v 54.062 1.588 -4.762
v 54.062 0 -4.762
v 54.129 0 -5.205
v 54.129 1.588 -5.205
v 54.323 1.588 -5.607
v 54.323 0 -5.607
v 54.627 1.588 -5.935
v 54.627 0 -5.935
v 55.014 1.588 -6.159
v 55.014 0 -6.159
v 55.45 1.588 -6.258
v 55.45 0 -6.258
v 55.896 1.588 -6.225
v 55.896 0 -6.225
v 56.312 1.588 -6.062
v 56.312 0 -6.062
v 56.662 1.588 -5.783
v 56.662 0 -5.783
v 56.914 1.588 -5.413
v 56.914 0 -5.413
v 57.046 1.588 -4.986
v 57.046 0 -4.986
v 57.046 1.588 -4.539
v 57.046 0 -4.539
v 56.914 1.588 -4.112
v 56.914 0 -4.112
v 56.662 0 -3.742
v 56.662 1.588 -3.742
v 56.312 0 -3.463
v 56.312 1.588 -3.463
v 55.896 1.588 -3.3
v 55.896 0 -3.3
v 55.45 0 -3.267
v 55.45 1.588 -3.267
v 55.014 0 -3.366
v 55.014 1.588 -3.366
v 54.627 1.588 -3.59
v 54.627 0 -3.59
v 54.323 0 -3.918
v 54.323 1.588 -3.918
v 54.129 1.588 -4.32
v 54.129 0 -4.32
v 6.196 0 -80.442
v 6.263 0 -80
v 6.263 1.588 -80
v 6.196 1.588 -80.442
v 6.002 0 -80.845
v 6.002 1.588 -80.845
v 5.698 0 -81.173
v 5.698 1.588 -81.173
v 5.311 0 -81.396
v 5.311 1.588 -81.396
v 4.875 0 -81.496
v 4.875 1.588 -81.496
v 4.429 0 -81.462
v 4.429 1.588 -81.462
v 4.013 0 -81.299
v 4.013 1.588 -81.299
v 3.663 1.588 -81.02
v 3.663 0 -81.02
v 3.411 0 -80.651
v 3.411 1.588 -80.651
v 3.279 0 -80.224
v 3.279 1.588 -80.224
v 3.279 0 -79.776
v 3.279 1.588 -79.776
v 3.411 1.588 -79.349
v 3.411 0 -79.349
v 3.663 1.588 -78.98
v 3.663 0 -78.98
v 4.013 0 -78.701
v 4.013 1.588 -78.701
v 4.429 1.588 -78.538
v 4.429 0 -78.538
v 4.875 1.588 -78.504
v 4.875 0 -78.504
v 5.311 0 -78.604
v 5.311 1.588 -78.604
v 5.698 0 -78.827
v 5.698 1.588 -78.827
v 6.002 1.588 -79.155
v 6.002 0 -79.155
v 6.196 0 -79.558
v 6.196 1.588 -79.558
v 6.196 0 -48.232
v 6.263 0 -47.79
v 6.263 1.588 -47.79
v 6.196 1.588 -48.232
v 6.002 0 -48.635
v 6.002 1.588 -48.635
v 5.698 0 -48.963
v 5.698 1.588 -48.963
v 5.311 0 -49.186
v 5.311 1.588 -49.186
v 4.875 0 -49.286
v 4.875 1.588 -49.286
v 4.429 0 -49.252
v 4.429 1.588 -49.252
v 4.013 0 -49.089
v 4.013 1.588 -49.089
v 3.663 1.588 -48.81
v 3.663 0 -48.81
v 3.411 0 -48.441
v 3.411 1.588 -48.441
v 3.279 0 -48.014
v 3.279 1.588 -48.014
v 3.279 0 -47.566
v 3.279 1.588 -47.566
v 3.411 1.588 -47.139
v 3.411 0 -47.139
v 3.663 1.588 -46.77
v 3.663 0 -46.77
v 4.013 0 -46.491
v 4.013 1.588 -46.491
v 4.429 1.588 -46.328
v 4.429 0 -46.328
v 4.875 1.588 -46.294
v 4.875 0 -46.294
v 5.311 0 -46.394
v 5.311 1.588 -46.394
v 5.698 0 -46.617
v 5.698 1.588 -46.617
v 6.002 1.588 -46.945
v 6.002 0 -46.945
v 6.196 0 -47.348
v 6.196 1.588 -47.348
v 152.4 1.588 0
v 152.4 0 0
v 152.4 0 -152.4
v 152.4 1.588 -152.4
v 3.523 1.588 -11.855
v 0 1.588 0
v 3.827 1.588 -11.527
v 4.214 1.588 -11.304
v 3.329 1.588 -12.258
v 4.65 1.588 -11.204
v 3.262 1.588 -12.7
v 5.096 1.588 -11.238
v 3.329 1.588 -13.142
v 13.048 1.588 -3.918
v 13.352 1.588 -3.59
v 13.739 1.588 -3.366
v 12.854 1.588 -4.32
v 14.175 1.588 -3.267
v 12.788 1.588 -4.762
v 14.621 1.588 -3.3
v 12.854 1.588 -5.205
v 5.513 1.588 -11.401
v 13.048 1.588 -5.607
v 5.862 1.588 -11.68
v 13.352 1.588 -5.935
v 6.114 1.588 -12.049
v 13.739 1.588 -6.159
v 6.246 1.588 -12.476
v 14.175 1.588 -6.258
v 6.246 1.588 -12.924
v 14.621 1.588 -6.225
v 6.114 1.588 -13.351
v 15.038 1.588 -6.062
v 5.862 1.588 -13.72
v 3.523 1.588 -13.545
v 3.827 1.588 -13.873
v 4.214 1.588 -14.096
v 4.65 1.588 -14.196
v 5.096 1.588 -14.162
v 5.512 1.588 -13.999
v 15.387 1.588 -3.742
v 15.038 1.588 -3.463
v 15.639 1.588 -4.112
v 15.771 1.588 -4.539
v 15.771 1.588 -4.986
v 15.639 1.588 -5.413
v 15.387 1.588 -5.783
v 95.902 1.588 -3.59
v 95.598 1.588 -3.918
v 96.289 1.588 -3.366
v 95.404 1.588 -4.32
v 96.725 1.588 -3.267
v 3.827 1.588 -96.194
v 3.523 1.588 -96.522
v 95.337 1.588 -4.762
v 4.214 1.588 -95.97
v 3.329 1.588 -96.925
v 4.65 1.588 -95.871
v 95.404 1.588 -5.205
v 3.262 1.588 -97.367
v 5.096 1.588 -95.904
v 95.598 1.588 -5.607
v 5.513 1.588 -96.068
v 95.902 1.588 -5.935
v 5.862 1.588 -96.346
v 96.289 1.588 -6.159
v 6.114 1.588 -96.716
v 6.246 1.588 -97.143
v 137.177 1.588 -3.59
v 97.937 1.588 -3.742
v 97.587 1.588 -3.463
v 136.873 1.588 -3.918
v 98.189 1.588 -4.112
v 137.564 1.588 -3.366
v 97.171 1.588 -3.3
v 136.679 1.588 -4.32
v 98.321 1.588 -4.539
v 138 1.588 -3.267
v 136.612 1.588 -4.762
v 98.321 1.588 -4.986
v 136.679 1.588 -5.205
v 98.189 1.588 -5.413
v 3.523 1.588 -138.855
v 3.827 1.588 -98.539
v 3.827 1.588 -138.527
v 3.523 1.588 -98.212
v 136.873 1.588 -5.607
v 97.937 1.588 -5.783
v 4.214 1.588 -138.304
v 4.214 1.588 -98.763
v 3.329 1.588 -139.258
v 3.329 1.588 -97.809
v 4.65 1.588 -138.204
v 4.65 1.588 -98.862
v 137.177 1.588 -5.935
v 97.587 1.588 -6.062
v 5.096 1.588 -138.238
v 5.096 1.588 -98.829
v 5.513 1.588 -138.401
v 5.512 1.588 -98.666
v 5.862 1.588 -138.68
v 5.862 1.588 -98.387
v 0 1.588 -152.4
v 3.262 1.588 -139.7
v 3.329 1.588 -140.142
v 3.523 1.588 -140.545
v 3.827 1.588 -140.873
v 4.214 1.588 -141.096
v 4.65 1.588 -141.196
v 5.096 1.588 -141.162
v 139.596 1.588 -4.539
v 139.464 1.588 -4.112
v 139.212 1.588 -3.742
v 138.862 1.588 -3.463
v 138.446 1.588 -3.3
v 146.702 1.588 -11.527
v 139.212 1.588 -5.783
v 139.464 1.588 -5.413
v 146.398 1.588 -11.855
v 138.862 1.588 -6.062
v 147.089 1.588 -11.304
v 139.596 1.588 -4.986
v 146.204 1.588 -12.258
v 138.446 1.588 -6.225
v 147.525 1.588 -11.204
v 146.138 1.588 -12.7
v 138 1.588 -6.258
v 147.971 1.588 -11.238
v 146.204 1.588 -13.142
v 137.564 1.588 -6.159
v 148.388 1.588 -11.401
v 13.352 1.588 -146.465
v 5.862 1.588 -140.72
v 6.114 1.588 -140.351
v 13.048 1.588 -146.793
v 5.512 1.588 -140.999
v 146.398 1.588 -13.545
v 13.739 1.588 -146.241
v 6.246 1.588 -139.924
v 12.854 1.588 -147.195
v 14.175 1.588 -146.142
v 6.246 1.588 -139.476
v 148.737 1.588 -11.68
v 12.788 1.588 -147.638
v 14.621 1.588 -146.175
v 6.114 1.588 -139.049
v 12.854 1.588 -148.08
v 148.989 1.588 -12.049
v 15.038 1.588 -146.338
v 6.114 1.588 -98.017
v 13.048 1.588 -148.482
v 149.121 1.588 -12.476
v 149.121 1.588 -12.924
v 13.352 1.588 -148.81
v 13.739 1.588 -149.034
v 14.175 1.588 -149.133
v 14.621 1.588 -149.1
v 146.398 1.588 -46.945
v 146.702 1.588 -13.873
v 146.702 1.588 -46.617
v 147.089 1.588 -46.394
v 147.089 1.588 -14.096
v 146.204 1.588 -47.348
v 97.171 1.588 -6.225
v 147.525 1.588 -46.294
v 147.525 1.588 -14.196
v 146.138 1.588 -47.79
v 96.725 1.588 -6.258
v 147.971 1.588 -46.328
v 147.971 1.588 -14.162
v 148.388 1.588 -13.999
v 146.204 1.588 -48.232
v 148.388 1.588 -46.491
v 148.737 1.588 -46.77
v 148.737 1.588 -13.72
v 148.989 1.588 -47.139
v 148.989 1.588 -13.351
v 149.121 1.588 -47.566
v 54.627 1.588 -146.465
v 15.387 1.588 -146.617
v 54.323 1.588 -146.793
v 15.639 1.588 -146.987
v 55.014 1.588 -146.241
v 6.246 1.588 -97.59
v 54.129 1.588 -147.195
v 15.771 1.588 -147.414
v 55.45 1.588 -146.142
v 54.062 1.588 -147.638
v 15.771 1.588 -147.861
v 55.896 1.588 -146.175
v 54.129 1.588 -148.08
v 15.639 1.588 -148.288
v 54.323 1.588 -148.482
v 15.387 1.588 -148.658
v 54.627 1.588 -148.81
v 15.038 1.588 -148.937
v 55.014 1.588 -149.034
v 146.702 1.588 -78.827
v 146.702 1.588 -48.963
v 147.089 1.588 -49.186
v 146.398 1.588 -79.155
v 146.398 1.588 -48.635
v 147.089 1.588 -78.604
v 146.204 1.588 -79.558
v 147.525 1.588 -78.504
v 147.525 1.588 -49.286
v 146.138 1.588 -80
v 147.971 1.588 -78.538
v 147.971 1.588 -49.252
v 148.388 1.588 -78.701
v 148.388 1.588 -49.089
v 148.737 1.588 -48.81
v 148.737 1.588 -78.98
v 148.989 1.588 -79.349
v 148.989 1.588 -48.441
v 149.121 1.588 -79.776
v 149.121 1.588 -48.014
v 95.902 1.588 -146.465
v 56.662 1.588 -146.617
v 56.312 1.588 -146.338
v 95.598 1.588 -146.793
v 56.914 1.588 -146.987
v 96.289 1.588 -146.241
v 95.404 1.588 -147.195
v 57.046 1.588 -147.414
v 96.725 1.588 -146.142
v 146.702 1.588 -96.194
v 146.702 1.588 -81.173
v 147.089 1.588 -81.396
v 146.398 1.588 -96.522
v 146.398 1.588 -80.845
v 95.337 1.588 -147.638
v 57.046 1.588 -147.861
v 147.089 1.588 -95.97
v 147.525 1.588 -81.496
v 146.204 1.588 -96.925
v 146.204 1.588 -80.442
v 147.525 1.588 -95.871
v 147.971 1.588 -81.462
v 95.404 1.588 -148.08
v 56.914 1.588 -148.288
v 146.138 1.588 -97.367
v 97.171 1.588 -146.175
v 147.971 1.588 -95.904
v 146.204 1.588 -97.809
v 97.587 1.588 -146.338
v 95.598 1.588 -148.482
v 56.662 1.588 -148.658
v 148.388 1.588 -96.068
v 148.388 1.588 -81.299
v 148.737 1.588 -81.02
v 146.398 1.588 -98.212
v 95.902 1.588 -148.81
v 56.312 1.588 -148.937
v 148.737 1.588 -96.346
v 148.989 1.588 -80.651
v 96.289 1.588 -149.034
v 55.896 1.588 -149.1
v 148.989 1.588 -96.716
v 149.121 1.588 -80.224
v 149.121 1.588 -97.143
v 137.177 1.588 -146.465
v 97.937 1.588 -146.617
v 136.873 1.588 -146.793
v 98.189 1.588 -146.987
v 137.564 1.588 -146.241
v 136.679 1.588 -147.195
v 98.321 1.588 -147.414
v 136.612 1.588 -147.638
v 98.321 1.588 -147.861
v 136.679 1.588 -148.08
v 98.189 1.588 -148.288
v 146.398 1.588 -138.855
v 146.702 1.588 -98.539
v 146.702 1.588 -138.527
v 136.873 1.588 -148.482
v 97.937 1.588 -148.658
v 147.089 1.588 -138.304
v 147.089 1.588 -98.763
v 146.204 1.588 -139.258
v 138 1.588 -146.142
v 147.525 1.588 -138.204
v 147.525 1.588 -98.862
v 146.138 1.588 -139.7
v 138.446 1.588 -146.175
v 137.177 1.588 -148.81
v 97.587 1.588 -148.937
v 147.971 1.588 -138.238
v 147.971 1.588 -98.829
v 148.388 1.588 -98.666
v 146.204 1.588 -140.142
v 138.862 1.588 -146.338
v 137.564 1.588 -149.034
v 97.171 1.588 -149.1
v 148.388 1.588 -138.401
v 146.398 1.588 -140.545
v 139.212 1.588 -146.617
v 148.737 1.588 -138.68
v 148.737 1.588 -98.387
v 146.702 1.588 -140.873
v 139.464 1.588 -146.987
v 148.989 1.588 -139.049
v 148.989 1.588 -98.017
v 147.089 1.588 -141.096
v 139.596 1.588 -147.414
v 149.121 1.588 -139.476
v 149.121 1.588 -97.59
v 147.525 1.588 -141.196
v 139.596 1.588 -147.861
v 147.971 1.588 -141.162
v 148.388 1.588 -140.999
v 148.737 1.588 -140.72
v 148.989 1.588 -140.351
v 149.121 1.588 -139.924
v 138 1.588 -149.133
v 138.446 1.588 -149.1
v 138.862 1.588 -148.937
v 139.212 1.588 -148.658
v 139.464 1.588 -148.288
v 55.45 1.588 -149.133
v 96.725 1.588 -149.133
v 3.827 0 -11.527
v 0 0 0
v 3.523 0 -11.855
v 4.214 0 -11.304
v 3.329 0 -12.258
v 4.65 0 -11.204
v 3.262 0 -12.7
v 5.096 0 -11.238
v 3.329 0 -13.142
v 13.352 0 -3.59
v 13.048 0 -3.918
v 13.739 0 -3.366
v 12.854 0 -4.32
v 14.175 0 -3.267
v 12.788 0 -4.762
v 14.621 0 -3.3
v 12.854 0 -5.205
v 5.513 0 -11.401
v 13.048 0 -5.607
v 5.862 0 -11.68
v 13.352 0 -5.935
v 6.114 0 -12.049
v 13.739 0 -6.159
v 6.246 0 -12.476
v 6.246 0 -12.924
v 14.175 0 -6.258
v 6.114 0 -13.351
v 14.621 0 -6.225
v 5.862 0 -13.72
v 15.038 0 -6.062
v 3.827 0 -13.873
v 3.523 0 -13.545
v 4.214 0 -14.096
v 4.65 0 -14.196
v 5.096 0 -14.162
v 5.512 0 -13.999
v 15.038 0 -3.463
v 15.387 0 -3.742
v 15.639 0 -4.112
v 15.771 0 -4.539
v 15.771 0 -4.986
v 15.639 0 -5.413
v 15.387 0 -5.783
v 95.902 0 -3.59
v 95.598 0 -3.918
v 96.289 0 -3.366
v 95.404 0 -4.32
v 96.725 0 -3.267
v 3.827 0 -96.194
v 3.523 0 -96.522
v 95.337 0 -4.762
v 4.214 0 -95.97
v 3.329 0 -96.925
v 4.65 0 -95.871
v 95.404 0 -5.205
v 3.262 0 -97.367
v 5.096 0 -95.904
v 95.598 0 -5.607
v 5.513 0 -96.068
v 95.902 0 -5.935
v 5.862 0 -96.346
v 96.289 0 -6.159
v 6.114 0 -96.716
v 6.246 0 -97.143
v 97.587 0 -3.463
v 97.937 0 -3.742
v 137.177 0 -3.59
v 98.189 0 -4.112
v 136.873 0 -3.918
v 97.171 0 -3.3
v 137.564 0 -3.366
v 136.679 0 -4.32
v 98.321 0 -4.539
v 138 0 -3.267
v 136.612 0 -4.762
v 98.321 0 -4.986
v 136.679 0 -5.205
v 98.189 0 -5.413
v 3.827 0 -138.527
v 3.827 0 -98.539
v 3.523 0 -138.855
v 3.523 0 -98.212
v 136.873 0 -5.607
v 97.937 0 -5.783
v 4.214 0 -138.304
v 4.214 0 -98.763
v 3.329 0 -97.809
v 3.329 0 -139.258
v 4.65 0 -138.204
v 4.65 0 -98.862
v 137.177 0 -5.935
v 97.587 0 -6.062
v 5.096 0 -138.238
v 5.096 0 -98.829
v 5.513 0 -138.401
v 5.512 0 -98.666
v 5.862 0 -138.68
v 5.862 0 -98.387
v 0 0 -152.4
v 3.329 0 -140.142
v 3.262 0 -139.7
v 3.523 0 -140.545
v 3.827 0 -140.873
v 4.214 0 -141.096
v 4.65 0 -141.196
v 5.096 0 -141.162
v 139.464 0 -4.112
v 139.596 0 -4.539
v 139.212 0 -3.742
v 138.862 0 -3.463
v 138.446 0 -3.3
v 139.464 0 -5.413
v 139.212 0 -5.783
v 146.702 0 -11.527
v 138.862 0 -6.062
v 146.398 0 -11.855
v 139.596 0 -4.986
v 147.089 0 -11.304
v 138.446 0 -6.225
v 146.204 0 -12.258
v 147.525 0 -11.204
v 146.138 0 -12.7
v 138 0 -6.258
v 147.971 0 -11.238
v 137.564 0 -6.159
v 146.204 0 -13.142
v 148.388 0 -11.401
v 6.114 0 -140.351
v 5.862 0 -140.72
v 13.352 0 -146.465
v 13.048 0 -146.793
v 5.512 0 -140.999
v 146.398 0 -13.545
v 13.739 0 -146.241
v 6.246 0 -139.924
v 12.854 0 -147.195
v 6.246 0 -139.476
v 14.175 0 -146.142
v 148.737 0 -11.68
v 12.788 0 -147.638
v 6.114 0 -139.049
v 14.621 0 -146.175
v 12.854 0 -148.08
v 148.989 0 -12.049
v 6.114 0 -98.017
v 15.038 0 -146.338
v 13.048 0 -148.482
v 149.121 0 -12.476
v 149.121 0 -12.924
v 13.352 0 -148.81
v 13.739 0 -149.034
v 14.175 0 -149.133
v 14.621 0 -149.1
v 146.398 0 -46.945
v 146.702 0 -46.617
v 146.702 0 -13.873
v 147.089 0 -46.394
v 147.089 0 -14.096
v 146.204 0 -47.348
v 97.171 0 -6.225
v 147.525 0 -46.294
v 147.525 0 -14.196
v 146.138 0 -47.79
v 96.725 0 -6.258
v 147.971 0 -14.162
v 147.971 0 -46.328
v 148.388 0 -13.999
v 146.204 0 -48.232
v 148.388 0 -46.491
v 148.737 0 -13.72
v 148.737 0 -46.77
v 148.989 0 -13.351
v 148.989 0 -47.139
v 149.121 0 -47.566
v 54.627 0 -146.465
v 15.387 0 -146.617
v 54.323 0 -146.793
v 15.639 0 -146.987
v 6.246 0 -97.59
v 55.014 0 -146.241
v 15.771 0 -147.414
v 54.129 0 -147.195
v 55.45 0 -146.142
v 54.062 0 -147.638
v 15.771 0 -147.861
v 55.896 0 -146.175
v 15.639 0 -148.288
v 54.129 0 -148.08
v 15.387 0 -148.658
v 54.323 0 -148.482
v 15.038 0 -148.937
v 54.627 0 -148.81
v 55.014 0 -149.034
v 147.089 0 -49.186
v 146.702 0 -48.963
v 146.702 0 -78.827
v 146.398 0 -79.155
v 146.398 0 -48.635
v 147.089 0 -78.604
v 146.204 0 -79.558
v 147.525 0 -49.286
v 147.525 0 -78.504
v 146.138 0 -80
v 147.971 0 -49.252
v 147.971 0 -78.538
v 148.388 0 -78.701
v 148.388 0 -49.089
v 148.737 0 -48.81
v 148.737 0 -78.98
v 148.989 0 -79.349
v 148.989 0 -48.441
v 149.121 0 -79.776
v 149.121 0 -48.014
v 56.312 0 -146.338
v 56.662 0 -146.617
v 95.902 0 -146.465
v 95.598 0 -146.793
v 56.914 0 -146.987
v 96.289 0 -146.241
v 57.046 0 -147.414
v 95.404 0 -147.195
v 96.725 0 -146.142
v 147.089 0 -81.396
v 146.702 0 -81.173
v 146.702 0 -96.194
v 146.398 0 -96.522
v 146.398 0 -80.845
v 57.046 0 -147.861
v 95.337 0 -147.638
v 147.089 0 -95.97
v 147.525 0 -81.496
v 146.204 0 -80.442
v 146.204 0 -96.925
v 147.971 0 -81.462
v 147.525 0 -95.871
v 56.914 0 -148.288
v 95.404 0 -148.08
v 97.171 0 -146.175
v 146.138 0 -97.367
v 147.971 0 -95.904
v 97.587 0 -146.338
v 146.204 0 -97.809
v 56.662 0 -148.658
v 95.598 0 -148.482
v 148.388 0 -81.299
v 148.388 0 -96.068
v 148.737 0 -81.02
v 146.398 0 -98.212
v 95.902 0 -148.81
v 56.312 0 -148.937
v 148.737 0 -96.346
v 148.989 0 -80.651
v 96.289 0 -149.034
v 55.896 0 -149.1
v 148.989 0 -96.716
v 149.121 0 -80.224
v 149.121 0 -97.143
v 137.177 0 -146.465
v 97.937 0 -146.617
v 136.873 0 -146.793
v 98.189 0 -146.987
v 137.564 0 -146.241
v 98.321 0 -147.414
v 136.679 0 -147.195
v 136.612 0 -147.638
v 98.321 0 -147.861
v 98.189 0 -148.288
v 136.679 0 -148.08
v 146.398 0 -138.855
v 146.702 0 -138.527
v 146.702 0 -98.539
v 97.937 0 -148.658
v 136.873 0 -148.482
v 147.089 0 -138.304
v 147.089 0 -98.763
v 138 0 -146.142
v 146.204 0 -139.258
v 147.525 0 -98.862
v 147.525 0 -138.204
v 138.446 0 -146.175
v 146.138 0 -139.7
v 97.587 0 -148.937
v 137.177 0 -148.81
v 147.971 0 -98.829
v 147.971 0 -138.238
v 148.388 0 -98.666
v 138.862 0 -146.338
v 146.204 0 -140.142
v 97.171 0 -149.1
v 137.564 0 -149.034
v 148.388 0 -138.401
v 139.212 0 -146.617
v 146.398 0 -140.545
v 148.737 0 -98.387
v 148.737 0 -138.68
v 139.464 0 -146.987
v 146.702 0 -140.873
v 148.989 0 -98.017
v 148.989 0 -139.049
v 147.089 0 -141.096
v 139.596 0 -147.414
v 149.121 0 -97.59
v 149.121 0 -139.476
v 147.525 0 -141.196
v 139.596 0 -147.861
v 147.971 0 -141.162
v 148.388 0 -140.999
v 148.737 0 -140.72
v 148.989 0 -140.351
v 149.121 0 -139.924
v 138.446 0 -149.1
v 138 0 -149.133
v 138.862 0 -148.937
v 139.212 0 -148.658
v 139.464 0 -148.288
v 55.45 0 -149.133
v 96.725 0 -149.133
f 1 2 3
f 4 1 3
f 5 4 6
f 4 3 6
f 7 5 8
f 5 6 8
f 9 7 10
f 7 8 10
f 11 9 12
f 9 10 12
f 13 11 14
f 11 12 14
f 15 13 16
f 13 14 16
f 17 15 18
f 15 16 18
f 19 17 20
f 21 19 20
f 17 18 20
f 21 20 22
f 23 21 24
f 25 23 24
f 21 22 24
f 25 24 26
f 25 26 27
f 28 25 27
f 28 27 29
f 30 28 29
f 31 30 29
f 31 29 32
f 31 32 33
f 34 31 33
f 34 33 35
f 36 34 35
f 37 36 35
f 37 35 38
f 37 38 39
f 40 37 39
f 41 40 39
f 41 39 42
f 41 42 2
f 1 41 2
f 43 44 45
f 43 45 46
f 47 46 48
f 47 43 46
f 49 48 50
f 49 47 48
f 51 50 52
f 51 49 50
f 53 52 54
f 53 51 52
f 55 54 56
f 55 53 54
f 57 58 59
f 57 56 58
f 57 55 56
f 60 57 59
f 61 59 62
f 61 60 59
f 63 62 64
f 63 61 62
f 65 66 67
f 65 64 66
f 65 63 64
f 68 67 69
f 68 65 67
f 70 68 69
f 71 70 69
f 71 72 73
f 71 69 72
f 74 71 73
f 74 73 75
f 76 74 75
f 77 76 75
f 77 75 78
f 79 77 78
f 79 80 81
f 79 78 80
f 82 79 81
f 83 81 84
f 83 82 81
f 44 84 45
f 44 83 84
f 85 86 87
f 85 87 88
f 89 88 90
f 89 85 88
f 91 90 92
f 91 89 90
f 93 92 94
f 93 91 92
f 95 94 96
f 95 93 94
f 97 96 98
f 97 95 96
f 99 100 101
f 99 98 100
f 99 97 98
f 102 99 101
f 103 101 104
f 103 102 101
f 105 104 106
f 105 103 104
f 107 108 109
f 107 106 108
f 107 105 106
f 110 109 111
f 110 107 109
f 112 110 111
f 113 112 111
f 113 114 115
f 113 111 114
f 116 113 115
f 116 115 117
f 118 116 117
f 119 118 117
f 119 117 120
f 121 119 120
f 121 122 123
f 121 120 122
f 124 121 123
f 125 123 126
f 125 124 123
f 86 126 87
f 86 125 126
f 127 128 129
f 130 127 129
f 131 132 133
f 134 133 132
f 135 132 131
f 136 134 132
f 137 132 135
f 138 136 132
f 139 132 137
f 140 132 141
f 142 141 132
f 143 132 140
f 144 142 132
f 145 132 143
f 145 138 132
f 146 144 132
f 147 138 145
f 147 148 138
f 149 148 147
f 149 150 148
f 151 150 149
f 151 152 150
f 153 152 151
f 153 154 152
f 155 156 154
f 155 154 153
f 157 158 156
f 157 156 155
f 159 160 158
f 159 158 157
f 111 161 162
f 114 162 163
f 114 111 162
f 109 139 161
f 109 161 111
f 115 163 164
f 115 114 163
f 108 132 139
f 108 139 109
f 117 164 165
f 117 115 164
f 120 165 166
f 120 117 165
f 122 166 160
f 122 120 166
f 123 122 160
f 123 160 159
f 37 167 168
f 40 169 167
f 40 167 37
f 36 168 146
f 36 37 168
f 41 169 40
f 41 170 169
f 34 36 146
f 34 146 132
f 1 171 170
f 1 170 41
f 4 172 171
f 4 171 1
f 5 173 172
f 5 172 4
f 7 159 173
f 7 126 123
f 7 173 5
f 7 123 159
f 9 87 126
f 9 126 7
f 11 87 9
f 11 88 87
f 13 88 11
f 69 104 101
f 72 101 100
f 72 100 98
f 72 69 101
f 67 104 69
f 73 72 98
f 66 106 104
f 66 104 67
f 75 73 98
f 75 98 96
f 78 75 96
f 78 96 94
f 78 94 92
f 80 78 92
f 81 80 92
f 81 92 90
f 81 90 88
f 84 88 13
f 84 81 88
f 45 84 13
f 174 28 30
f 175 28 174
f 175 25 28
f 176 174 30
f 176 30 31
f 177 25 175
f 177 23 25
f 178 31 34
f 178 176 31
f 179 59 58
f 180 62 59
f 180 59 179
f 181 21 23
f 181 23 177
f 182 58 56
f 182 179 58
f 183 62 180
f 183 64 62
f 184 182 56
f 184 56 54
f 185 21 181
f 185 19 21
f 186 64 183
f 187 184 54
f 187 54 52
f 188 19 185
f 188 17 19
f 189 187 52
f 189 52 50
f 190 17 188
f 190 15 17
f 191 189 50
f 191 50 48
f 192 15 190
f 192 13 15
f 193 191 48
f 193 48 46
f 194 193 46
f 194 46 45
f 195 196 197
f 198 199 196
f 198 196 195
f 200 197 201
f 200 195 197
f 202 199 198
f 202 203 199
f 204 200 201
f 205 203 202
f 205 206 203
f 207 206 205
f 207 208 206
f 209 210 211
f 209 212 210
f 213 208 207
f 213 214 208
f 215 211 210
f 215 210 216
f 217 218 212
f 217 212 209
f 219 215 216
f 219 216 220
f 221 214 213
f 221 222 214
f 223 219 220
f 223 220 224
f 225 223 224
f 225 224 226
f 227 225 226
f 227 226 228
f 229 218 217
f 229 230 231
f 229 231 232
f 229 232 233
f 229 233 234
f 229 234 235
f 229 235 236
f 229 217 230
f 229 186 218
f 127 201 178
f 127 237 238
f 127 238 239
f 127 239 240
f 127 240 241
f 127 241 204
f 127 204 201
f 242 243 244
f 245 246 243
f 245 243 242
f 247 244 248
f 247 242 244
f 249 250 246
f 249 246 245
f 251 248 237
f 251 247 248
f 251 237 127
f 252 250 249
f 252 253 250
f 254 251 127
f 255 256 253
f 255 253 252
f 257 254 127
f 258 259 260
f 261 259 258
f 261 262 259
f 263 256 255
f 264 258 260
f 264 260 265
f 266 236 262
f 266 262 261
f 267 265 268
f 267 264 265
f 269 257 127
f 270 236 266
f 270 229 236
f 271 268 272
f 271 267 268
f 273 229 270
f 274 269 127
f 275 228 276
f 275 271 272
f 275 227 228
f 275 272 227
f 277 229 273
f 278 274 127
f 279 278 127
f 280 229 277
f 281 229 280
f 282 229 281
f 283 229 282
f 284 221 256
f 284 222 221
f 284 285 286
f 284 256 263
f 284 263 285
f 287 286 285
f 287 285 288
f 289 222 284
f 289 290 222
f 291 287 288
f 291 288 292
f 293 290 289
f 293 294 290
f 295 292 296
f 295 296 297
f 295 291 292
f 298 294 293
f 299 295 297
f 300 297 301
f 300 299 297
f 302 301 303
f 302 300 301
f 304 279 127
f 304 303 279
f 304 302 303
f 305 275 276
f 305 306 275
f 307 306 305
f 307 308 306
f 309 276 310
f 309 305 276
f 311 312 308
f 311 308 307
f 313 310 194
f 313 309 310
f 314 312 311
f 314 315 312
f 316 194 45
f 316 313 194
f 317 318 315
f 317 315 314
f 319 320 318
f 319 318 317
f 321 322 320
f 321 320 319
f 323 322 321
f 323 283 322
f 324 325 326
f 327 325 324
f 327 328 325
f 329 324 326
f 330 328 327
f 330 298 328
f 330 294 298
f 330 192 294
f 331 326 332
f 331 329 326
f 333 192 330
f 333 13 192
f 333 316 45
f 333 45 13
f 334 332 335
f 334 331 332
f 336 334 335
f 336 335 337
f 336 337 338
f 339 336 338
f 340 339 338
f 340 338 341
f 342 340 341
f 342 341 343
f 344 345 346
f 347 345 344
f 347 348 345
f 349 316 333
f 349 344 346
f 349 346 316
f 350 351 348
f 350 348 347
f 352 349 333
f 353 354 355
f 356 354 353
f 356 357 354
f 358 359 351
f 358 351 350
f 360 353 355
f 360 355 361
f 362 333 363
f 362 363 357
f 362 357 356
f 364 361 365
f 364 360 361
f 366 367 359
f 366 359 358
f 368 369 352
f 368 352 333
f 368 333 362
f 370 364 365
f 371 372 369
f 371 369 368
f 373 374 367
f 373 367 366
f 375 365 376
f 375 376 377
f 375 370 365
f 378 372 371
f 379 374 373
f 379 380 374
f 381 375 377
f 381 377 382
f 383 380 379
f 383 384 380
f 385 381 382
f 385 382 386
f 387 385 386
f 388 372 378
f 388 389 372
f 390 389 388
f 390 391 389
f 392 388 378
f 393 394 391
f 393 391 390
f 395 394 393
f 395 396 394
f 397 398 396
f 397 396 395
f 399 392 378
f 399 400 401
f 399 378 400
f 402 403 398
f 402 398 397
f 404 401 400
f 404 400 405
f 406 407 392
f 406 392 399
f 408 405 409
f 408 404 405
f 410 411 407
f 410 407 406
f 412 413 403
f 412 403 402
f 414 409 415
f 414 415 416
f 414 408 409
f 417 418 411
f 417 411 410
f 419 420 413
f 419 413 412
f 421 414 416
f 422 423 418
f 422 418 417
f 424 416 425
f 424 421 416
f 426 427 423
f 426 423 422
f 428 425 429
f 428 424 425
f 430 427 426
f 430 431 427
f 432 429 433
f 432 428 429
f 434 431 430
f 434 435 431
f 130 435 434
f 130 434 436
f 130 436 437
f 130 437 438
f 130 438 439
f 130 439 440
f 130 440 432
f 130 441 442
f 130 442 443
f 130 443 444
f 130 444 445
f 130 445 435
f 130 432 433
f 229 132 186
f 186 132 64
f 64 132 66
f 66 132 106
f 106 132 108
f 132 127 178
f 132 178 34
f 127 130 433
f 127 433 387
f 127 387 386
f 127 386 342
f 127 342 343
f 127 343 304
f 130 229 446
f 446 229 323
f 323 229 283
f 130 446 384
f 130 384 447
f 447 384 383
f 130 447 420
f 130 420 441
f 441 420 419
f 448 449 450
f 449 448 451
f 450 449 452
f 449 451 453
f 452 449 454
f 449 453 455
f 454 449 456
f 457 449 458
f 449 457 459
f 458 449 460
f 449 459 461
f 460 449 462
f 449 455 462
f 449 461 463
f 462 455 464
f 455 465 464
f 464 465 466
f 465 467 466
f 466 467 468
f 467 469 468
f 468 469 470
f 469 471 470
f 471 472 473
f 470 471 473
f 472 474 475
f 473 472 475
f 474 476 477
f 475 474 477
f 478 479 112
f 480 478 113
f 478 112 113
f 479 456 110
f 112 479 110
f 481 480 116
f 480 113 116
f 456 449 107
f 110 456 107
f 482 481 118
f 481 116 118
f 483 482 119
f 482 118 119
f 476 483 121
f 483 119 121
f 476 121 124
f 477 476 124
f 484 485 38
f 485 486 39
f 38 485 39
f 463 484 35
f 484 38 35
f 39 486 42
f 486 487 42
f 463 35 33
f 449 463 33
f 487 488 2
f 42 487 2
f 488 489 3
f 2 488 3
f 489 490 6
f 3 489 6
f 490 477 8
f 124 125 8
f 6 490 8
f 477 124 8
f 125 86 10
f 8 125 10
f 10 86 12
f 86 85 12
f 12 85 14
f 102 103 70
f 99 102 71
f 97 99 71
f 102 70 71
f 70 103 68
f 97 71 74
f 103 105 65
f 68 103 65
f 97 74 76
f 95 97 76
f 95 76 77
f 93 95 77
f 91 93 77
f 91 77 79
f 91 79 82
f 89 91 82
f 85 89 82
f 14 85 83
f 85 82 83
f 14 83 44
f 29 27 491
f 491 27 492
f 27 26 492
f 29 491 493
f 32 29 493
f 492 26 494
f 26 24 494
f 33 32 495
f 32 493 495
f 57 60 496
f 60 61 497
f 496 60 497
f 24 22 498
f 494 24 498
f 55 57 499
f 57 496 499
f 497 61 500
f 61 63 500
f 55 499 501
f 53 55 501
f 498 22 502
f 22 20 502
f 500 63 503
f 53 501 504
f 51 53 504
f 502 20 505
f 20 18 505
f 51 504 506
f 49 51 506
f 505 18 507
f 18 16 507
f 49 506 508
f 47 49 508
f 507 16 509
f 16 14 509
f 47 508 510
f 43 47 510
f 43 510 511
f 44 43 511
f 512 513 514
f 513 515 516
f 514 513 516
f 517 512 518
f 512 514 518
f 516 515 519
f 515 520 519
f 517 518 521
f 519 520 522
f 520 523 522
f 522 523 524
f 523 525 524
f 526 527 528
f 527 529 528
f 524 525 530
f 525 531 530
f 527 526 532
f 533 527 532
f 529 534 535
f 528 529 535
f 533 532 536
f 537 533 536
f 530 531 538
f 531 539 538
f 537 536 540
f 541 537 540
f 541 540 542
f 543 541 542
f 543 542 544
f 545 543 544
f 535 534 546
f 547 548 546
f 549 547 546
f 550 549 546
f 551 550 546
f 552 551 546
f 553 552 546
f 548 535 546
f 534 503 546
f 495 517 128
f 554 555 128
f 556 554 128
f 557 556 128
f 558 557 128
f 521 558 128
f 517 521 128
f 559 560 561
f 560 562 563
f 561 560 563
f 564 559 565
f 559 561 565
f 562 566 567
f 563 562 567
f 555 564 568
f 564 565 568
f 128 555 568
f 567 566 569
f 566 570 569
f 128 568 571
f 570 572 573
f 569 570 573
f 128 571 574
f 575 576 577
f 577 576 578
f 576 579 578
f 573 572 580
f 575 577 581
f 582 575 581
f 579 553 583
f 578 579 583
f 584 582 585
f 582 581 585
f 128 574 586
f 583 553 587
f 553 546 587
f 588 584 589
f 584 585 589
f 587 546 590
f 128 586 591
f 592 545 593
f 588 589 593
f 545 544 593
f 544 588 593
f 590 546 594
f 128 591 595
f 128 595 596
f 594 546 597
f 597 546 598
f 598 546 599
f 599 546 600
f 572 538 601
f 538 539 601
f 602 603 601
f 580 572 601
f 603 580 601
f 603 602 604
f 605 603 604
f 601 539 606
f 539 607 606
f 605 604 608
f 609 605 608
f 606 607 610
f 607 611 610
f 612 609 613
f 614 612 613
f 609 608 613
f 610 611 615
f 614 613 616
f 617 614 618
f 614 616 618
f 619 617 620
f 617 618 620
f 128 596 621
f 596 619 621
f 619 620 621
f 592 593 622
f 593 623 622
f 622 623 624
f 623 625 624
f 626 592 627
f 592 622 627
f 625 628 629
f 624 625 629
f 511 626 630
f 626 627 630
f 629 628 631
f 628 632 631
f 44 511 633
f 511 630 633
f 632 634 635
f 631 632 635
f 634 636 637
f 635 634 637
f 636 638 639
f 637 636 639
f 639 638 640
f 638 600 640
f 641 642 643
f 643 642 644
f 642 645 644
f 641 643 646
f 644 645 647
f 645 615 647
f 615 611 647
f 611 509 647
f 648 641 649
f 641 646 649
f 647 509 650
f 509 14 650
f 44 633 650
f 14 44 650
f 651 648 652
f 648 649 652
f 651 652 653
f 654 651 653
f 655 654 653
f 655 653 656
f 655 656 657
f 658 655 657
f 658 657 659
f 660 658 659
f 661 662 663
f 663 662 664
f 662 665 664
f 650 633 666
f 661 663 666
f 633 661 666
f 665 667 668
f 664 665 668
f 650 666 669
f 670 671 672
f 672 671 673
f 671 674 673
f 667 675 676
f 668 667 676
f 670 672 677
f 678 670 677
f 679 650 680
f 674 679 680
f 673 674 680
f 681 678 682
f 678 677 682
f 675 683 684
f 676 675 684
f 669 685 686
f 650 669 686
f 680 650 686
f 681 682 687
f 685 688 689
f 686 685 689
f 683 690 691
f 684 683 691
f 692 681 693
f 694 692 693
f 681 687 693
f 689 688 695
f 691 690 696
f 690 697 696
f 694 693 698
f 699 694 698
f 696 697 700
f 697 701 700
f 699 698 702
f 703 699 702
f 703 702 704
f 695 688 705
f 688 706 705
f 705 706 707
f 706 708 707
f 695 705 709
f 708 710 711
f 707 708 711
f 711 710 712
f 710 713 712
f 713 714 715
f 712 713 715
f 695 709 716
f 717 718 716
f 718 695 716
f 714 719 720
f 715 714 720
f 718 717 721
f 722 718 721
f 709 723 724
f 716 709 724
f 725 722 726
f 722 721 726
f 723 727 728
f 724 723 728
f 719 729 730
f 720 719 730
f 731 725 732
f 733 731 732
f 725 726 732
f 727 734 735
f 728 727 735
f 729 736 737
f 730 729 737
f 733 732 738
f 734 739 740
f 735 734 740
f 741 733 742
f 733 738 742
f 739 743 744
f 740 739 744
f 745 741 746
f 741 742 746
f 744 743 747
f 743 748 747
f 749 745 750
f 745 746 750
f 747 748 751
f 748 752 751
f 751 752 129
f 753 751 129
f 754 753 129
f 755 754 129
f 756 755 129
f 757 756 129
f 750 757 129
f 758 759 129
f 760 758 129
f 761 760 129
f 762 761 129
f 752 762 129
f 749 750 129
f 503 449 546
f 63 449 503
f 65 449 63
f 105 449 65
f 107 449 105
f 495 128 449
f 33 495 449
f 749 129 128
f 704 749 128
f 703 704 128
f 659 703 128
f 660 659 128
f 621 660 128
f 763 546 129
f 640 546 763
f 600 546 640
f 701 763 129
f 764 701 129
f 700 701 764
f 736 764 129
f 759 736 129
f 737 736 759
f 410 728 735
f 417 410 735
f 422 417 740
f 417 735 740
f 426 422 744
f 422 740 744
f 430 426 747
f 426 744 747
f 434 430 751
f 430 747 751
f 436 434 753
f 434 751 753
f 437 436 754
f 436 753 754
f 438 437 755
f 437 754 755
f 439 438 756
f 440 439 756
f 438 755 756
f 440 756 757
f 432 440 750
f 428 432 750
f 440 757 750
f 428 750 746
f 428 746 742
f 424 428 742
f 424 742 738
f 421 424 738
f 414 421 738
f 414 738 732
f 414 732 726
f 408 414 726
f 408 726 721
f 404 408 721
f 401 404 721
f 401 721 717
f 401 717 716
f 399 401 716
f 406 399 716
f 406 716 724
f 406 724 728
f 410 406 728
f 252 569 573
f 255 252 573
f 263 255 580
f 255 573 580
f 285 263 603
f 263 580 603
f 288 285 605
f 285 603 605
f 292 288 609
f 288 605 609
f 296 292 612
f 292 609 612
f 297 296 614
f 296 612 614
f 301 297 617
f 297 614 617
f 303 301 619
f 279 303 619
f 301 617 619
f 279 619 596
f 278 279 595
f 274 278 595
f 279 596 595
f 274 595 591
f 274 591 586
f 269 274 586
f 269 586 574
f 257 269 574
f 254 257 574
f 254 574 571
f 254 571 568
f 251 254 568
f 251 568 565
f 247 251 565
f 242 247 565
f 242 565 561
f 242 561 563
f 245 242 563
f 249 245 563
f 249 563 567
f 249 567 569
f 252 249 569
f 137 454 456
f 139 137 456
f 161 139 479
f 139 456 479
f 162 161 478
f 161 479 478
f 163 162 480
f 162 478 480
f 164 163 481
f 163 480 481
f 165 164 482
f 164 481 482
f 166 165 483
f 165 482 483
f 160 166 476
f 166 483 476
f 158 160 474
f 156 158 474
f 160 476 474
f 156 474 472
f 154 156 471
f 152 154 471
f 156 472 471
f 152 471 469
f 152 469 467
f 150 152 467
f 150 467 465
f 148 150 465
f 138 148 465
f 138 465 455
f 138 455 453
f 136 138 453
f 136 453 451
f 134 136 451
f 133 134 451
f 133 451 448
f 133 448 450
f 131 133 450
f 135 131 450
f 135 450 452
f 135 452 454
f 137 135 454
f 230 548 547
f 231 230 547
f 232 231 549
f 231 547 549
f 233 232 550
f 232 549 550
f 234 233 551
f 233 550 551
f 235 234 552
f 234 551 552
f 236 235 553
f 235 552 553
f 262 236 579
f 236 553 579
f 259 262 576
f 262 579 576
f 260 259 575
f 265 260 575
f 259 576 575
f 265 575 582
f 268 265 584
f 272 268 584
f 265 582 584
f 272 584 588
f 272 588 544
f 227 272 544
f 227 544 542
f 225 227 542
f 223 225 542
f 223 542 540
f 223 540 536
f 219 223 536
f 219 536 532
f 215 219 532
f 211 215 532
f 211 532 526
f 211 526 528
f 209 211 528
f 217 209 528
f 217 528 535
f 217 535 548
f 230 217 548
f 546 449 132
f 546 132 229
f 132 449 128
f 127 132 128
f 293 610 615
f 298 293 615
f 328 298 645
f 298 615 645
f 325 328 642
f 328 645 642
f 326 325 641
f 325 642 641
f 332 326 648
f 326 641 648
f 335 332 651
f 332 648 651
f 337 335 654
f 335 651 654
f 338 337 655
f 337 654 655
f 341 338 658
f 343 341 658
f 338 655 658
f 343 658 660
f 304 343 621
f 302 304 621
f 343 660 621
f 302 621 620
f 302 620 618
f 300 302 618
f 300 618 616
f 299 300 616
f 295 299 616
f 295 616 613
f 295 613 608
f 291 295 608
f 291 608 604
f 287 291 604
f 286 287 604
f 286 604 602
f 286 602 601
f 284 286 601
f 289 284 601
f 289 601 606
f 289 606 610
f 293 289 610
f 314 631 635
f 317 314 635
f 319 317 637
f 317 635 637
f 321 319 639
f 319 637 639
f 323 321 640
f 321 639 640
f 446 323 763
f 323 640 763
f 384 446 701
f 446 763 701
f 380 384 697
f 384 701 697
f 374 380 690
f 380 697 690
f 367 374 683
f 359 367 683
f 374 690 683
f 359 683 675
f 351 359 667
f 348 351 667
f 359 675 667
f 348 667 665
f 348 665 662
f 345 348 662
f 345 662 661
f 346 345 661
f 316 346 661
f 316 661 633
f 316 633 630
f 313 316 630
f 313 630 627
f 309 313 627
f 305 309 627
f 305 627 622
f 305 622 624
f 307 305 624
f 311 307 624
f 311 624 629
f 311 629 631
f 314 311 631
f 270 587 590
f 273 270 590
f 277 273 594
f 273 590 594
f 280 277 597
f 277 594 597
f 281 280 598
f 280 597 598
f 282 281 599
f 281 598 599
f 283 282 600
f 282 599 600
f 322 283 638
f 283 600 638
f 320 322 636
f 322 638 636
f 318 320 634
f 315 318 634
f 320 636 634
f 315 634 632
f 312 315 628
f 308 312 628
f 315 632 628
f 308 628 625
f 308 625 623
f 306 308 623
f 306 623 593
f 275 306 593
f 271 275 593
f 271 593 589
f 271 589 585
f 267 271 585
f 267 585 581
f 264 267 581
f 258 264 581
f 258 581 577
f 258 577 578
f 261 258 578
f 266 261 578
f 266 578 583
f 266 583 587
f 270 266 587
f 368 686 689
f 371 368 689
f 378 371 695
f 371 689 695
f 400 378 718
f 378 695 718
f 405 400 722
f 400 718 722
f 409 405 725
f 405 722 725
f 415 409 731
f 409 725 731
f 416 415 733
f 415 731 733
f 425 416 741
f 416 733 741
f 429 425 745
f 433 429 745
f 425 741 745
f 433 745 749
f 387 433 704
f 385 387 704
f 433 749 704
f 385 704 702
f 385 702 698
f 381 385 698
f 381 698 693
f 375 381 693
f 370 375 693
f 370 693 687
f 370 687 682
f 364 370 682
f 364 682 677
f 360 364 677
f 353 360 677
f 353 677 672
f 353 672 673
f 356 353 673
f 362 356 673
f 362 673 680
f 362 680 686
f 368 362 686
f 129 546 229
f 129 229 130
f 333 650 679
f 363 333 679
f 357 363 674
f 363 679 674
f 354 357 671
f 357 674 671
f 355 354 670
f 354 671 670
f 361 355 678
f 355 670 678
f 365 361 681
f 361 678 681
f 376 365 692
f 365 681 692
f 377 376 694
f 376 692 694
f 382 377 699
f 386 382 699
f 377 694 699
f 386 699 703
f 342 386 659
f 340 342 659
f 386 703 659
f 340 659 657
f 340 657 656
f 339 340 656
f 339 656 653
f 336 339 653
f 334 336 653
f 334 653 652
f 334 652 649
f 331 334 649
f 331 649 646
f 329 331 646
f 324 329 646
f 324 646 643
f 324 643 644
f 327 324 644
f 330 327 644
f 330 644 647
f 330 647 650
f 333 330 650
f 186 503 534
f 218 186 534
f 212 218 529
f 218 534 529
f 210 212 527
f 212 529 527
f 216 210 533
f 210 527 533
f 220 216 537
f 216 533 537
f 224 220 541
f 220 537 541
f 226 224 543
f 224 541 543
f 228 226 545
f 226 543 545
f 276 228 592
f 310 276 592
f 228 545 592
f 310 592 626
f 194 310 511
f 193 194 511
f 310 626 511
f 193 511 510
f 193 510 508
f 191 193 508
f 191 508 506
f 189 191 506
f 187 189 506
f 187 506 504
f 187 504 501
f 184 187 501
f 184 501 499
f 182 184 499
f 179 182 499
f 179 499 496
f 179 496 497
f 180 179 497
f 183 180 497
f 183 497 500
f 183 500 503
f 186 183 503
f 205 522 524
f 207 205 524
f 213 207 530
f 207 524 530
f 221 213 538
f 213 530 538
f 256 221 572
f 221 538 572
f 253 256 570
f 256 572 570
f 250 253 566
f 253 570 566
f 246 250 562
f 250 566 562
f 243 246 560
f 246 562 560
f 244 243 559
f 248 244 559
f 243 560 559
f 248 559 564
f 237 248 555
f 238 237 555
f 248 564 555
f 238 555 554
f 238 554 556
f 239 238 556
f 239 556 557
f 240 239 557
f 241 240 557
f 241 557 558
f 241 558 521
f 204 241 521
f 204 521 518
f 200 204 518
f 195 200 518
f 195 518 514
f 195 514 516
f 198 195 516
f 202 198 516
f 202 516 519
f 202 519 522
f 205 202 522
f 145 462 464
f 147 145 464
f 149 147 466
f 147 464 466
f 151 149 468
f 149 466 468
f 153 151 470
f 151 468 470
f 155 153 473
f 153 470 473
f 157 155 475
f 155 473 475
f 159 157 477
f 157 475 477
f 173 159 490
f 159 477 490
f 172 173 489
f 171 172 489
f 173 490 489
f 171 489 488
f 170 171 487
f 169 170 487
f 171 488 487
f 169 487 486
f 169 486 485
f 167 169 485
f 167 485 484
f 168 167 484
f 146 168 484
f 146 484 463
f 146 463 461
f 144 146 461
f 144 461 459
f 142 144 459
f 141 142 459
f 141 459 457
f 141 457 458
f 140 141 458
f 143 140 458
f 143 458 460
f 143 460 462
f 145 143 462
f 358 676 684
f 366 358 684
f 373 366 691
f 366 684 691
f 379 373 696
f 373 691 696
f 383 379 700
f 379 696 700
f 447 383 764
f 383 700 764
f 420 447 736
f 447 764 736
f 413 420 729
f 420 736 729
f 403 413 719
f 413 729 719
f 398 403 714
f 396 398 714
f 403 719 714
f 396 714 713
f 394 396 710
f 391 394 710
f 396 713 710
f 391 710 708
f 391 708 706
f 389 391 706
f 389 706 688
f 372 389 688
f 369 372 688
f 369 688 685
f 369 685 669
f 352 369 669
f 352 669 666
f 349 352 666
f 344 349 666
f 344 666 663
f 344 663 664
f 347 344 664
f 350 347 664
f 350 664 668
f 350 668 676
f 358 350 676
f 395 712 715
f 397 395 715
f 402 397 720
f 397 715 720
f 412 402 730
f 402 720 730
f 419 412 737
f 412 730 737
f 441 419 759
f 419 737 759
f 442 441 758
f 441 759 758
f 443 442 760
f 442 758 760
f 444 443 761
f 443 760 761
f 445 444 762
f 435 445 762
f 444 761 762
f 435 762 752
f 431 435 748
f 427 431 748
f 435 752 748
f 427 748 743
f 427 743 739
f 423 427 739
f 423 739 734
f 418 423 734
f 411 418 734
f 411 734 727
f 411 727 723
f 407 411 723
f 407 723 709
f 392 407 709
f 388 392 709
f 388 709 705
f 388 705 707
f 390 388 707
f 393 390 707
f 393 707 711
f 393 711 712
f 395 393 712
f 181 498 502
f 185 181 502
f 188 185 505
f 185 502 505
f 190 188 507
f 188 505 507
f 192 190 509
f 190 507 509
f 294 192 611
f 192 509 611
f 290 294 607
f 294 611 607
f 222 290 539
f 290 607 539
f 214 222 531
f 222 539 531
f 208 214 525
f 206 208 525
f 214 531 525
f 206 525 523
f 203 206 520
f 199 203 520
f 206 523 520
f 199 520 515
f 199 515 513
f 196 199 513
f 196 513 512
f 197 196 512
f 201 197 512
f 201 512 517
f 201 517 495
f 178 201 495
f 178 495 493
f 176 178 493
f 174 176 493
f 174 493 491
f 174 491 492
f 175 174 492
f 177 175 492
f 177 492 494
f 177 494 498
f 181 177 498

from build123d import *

# Parameters (mm, degrees)
SKETCH2_W             = 152.4
SKETCH2_H             = 152.4
BOSS_EXTRUDE1_DEPTH   = 1.5875
F_3_0MM_DOWEL_HOLE2_D = 3
F_3_0MM_DOWEL_HOLE3_D = 3
LPATTERN1_COUNT       = 4
LPATTERN1_PITCH       = 42.333333333
LPATTERN2_COUNT       = 4
LPATTERN2_PITCH       = 41.275
F_3_0MM_DOWEL_HOLE1_D = 3


with BuildPart() as part:
    # Sketch2 → Boss-Extrude1 (new body)
    with BuildSketch(Plane(origin=(0, 0, 0), x_dir=(1, 0, 0), z_dir=(0, 1, 0))):
        with Locations((76.2, 76.2)):
            Rectangle(SKETCH2_W, SKETCH2_H)
    extrude(amount=BOSS_EXTRUDE1_DEPTH)

    # Ø3.0mm Dowel Hole2 (through all)
    with Locations(Plane(origin=(0, 1.5875, 0), x_dir=(1, 0, 0), z_dir=(0, 1, 0))):
        with Locations((14.2875, 147.6375), (14.2875, 4.7625)):
            f_3_0mm_dowel_hole2 = Hole(F_3_0MM_DOWEL_HOLE2_D / 2)

    # Ø3.0mm Dowel Hole3 (through all)
    with Locations(Plane(origin=(0, 1.5875, 0), x_dir=(1, 0, 0), z_dir=(0, 1, 0))):
        with Locations((4.7625, 139.7), (147.6375, 139.7)):
            f_3_0mm_dowel_hole3 = Hole(F_3_0MM_DOWEL_HOLE3_D / 2)

    # LPattern1: Ø3.0mm Dowel Hole3 ×4, 1 skipped
    with Locations(*[(0, 0, i * LPATTERN1_PITCH) for i in range(1, LPATTERN1_COUNT) if i not in (2,)]):
        add(f_3_0mm_dowel_hole3, mode=Mode.SUBTRACT)

    # LPattern2: Ø3.0mm Dowel Hole2 ×4
    with Locations(*[(i * LPATTERN2_PITCH, 0, 0) for i in range(1, LPATTERN2_COUNT)]):
        add(f_3_0mm_dowel_hole2, mode=Mode.SUBTRACT)

    # Ø3.0mm Dowel Hole1 (through all)
    with Locations(Plane(origin=(0, 1.5875, 0), x_dir=(1, 0, 0), z_dir=(0, 1, 0))):
        with Locations((147.6375, 47.79), (147.6375, 80)):
            f_3_0mm_dowel_hole1 = Hole(F_3_0MM_DOWEL_HOLE1_D / 2)

    # Mirror1: Ø3.0mm Dowel Hole1 across plane
    add(f_3_0mm_dowel_hole1.mirror(Plane(origin=(76.2, 0, 0), x_dir=(0, 0, 1), z_dir=(1, 0, 0))), mode=Mode.SUBTRACT)


solid = part.part
